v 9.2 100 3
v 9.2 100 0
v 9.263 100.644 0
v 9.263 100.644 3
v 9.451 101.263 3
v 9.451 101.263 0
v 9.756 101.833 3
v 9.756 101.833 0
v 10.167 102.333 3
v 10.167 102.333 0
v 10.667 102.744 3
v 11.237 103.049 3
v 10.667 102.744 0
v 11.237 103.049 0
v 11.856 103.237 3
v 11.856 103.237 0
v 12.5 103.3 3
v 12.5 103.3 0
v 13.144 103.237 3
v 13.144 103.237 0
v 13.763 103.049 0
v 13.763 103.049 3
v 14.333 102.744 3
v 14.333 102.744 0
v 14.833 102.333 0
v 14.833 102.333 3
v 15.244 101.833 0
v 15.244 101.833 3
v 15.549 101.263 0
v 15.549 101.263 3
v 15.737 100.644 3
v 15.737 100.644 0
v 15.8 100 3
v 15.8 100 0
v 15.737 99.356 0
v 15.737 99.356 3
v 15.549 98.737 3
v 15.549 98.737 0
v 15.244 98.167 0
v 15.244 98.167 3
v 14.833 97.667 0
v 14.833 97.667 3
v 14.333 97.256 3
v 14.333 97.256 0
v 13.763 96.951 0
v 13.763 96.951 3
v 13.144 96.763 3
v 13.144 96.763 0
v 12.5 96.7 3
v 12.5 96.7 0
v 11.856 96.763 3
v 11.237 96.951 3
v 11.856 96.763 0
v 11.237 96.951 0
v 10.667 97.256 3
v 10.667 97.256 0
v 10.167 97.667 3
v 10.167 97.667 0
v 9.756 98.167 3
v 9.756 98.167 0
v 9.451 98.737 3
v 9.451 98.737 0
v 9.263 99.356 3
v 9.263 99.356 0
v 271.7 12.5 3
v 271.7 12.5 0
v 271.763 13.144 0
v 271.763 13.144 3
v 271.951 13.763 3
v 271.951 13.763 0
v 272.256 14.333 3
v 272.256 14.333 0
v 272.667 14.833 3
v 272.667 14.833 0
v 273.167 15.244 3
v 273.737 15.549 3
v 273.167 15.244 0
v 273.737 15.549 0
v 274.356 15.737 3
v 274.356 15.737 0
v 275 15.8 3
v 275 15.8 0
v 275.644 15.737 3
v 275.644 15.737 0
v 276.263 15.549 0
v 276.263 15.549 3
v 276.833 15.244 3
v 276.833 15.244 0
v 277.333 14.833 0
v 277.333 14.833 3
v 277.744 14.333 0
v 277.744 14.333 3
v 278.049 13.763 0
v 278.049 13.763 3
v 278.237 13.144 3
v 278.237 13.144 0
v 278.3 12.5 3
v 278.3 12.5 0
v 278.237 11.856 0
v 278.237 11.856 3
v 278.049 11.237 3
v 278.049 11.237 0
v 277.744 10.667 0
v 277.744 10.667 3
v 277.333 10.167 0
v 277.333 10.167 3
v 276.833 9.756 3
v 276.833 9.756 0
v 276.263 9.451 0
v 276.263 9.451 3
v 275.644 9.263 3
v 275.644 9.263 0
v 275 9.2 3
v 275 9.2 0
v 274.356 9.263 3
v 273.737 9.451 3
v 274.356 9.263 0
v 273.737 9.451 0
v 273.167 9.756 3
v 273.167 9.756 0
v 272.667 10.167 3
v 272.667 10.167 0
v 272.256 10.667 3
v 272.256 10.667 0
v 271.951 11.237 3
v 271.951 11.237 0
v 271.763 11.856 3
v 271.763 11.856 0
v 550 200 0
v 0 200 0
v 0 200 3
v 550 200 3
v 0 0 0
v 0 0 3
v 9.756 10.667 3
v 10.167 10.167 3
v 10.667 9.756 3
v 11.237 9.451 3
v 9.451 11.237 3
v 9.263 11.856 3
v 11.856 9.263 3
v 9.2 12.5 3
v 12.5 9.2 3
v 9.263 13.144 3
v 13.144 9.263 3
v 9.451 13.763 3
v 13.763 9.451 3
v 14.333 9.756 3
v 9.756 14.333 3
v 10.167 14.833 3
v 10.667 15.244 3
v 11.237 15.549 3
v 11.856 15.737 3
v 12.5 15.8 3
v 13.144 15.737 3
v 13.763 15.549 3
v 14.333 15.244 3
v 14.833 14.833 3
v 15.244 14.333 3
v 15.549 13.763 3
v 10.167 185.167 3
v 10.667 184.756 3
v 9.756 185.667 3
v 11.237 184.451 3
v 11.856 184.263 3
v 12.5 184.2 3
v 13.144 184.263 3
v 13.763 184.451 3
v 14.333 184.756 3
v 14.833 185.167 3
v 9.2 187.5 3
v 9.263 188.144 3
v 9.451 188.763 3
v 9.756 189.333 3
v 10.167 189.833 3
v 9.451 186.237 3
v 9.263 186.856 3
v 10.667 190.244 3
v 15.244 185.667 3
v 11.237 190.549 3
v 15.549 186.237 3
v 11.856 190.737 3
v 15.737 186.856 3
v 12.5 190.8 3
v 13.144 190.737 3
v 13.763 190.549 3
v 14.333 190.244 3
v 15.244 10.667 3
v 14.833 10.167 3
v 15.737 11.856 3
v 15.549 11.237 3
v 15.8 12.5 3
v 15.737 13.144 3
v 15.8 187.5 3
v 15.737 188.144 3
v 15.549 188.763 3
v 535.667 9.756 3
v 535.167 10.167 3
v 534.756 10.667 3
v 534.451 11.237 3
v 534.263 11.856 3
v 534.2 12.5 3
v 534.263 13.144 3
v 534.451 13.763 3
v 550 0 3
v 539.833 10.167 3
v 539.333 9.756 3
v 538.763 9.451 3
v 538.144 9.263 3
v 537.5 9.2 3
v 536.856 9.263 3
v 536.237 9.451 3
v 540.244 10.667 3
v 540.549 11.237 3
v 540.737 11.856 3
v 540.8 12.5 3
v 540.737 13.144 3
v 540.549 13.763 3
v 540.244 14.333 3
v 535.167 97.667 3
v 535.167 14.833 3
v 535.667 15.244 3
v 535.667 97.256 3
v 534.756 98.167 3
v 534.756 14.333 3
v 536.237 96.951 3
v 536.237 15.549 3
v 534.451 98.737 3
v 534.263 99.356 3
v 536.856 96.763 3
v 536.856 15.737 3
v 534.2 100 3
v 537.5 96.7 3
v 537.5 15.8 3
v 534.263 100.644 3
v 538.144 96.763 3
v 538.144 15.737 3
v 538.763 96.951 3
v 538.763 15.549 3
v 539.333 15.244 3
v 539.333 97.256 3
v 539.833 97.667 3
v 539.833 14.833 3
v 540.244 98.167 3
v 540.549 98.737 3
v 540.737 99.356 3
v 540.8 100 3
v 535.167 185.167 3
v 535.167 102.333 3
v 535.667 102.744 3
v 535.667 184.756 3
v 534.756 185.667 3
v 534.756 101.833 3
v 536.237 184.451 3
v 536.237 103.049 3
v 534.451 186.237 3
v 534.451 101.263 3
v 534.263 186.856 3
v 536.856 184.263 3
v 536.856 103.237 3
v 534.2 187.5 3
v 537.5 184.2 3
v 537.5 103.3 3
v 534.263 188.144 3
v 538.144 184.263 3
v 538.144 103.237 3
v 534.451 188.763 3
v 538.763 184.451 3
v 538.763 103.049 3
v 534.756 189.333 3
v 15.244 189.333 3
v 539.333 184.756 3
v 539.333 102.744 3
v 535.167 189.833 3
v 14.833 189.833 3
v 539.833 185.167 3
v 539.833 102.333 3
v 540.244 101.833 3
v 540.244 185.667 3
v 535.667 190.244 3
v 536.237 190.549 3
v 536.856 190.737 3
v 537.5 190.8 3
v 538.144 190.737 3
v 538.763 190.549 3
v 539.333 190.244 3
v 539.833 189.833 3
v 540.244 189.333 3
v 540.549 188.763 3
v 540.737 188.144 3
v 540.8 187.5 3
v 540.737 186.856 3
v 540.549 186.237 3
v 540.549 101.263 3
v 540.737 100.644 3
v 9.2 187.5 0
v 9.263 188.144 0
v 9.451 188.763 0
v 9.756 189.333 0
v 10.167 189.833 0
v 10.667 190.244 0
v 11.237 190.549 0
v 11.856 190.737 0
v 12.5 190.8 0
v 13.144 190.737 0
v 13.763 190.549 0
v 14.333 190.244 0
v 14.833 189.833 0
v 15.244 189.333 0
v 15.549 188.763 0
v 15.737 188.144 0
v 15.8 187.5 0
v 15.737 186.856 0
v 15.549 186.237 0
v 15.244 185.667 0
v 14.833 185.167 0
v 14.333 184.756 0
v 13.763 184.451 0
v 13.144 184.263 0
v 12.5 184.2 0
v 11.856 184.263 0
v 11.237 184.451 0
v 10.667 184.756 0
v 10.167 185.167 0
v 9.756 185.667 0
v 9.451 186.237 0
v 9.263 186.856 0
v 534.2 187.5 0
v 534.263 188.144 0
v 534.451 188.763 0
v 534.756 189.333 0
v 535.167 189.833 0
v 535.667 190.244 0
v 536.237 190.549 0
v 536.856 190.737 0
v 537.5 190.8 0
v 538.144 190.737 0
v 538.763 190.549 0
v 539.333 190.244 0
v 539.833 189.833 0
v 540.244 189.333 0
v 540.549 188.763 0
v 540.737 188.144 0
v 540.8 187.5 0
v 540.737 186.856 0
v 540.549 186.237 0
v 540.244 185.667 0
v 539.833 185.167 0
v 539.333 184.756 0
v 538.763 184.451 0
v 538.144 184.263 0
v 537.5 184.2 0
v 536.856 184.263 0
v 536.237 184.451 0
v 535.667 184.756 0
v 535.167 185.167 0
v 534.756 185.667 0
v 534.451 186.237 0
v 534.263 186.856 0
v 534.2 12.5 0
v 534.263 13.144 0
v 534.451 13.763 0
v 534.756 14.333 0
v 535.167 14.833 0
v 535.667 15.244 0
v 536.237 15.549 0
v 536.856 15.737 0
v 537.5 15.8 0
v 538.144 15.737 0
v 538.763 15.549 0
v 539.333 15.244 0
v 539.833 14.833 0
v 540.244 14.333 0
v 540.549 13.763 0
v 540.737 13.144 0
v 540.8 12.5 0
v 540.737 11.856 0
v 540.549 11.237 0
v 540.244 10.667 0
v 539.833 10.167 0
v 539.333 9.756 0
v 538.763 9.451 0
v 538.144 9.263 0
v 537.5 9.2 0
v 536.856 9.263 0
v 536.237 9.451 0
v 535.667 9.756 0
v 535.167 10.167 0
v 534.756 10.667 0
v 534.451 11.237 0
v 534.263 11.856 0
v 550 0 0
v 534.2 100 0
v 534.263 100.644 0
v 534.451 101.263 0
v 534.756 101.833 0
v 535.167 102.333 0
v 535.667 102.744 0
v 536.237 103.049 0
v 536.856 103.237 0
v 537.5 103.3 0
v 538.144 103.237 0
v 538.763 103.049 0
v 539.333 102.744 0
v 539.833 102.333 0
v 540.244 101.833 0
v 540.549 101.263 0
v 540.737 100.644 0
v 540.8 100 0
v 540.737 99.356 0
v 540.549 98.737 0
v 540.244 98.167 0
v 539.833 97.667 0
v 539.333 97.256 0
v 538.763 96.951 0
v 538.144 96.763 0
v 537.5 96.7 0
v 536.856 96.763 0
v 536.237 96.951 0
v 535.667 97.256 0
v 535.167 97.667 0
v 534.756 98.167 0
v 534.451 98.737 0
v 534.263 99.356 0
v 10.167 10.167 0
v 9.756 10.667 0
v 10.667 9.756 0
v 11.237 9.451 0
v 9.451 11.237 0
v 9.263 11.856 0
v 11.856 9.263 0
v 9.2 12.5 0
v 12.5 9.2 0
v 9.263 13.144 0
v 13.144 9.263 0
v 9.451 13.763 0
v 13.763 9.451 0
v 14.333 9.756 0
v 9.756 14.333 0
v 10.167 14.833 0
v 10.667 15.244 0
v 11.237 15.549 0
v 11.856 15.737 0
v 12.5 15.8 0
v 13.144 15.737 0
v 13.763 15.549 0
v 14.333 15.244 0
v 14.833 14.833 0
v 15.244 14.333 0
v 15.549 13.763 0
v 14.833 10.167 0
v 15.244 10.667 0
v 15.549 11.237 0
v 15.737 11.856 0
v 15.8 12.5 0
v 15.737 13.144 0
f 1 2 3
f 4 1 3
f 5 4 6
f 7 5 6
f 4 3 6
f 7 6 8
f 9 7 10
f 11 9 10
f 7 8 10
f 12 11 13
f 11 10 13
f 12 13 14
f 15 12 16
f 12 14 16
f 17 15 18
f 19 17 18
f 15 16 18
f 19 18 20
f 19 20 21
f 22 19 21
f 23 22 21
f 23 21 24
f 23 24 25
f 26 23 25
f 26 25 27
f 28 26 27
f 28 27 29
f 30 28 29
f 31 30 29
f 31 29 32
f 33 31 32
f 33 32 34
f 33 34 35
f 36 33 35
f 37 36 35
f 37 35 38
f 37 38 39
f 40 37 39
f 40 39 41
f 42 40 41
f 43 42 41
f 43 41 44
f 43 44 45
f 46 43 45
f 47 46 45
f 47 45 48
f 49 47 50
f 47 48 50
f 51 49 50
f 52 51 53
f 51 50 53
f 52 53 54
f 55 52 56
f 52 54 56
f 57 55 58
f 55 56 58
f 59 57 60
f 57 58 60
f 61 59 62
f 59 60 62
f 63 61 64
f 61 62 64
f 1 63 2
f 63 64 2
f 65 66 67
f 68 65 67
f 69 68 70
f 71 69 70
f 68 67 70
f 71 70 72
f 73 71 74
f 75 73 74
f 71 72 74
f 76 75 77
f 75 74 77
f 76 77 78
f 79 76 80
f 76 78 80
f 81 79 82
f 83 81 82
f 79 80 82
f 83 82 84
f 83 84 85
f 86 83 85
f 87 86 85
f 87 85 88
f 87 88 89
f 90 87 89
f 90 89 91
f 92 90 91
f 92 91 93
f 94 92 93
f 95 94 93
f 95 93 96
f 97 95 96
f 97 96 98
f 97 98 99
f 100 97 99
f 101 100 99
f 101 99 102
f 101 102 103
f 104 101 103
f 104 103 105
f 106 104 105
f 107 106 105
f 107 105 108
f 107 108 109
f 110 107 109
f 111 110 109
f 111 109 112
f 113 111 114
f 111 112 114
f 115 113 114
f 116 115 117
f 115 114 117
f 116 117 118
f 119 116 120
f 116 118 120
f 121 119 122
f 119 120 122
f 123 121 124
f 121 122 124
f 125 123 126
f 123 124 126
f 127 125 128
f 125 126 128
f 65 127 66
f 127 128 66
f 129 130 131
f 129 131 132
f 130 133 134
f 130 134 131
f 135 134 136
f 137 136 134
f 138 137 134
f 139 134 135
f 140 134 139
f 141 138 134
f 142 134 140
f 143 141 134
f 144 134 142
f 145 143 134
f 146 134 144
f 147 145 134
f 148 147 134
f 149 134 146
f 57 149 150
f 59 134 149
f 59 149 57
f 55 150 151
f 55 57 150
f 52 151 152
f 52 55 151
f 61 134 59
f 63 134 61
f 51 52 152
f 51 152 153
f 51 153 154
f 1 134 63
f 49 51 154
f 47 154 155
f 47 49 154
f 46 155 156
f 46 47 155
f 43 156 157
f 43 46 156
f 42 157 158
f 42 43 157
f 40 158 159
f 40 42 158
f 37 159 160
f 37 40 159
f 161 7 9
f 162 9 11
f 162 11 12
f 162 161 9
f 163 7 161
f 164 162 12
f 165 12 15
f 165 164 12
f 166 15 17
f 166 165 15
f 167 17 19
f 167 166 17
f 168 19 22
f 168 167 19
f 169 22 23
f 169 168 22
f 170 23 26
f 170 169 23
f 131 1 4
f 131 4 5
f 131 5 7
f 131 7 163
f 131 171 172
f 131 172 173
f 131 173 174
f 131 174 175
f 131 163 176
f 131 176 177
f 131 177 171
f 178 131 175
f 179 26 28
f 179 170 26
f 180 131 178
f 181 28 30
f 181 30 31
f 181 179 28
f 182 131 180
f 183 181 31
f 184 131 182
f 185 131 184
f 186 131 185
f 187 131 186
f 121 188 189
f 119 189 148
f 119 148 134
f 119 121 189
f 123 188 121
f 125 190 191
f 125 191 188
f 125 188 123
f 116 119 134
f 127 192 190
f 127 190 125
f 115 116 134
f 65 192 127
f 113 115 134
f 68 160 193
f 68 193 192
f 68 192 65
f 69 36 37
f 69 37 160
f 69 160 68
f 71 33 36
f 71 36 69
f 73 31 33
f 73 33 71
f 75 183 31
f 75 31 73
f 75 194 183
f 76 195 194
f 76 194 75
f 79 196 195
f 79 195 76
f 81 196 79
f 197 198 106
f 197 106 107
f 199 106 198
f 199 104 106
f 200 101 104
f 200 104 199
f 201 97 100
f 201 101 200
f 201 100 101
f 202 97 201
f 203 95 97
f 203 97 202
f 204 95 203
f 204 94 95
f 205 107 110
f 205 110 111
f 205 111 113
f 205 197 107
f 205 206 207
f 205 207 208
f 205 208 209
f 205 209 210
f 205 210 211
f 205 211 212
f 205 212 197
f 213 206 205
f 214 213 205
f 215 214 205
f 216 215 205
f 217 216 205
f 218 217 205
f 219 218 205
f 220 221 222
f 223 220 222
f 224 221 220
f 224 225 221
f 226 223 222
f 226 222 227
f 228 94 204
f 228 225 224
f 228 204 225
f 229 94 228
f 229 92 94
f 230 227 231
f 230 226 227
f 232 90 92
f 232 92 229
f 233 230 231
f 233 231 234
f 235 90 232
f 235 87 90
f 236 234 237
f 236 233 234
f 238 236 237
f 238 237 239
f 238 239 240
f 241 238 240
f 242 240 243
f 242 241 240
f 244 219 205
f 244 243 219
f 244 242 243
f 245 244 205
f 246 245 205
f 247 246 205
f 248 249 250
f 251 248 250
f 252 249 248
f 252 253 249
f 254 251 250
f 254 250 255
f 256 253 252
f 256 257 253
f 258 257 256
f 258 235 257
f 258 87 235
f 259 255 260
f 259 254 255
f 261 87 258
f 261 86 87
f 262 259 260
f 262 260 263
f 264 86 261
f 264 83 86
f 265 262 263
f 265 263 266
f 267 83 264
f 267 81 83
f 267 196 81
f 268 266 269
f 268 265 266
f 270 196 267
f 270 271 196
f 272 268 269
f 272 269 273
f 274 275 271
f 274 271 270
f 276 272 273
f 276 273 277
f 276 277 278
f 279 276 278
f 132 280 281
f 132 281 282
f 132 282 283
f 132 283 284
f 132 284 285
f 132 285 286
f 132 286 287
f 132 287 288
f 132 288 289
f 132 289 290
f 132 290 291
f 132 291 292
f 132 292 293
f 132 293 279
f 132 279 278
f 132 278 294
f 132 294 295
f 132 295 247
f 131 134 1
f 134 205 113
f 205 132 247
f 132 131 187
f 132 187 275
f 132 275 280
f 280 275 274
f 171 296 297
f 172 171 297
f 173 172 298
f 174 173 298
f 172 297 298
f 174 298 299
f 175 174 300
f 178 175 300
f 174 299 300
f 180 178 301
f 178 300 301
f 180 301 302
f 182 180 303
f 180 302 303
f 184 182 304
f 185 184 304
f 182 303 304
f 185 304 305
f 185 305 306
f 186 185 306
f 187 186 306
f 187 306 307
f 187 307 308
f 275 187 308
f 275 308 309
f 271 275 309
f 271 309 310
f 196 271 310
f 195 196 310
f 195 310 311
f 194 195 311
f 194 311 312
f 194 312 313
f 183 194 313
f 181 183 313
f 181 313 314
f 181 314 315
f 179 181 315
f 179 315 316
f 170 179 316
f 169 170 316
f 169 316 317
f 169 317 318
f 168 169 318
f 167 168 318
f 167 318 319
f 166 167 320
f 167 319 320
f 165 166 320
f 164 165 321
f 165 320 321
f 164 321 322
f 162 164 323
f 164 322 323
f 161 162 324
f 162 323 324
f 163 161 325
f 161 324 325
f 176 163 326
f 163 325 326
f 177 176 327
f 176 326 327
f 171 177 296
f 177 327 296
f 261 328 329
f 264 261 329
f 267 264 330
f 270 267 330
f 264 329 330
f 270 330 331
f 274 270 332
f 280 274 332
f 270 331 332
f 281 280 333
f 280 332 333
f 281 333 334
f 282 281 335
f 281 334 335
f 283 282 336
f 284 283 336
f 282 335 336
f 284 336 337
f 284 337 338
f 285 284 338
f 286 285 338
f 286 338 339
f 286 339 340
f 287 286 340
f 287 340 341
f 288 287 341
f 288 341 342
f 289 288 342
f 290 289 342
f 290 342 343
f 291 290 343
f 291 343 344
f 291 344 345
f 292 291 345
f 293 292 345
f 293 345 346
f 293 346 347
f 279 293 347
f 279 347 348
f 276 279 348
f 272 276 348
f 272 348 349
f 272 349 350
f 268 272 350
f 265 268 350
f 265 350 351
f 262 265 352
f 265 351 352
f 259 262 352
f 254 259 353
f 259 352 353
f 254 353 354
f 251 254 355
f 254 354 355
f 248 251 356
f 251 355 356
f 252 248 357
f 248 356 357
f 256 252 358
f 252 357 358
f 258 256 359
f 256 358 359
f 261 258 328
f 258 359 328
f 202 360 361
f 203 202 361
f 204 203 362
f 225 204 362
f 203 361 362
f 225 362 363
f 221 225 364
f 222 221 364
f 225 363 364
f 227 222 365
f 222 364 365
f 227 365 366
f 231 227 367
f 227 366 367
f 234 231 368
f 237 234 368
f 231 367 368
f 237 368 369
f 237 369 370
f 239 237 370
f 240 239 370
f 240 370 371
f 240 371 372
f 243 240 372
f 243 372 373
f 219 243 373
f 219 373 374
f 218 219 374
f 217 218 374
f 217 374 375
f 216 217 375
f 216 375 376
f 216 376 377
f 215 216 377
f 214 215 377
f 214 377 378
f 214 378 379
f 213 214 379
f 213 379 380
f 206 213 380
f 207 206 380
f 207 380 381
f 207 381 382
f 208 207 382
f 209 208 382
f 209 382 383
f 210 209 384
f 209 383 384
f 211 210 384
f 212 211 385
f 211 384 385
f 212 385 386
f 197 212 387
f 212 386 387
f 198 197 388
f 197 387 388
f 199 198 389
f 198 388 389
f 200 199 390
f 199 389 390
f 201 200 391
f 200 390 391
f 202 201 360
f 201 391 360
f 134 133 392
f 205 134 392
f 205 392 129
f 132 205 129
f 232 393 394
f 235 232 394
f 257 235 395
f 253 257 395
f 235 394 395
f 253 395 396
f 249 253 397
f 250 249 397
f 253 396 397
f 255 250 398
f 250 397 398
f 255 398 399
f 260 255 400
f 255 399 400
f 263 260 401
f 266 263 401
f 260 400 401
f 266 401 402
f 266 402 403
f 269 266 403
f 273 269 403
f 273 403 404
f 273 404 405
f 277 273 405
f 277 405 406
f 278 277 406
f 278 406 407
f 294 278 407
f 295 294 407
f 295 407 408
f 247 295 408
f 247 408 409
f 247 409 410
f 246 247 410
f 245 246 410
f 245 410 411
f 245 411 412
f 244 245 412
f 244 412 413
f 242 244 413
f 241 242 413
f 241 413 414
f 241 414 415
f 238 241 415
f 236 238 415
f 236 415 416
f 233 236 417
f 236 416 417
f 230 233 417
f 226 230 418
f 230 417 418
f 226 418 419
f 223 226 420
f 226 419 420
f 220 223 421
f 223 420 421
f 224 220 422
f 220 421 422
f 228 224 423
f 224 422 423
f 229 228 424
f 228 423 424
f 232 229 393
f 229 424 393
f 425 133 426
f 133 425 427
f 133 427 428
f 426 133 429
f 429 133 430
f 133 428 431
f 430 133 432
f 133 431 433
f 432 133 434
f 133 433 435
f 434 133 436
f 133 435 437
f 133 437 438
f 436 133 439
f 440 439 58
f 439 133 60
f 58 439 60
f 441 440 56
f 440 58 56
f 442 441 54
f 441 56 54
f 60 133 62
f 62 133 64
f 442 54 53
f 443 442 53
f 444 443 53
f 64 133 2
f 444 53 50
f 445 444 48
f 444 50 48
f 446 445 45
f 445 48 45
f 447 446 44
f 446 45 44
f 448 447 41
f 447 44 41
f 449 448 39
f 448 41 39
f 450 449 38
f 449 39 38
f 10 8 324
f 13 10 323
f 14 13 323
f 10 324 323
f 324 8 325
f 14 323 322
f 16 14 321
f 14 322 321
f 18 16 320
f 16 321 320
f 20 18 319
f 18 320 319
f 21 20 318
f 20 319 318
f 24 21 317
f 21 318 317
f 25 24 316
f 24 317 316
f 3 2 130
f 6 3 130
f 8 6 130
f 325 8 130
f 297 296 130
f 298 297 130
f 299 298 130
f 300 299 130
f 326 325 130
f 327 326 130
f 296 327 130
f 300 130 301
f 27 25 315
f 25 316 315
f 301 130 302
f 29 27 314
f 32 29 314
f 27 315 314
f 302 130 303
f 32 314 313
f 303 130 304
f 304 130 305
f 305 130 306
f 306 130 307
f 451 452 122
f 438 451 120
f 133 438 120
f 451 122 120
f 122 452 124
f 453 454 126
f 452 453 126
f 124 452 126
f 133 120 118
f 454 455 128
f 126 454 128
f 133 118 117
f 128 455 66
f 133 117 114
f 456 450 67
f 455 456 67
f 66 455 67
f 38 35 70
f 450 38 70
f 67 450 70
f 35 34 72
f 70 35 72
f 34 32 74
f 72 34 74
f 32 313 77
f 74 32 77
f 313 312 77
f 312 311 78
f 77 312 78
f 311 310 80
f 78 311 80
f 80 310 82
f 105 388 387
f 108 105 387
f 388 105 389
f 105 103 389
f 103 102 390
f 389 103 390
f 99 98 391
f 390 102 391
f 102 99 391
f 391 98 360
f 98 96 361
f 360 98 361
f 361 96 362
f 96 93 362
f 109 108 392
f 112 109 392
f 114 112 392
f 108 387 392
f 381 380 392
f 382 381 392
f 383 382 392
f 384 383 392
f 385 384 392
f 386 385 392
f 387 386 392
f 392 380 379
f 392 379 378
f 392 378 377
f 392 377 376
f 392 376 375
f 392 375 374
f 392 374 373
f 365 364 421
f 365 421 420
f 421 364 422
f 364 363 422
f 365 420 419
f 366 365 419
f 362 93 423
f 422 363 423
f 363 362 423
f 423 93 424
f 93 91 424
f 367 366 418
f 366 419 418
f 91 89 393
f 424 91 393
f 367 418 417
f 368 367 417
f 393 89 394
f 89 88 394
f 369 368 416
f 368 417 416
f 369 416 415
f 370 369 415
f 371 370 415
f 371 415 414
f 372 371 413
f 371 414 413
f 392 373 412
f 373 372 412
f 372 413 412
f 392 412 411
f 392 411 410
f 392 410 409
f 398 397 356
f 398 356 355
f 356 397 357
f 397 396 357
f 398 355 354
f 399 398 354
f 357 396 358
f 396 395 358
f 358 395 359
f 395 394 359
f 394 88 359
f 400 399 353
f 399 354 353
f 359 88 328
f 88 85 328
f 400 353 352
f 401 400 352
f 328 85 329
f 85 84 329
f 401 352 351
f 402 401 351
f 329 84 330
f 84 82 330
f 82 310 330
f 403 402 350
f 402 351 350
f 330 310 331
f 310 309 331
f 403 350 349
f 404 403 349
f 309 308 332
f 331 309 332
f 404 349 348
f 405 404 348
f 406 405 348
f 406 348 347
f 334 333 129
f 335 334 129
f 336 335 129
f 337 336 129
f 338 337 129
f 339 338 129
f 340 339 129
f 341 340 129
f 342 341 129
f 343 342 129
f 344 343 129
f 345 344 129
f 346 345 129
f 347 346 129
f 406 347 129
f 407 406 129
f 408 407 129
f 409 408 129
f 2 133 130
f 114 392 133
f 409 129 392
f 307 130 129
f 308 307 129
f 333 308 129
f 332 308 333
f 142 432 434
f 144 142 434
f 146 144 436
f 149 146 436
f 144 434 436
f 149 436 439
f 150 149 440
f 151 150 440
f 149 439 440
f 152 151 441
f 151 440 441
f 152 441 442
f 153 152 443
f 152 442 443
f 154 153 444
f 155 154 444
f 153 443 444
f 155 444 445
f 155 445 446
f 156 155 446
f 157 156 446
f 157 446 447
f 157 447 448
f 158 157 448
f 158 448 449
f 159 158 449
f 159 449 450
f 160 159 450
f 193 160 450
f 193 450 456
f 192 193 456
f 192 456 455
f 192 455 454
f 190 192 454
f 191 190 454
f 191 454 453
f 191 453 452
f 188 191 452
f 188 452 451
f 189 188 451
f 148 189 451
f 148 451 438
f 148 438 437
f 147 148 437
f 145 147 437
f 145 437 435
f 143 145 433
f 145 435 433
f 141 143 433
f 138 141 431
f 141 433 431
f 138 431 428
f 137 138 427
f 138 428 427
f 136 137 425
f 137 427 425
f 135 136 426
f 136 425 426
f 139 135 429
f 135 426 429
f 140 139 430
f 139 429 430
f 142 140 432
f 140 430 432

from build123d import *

# Parameters (mm, degrees)
SKETCH1_W            = 550
SKETCH1_H            = 200
BOSS_EXTRUDE1_DEPTH  = 3
M6_CLEARANCE_HOLE1_D = 6.6


with BuildPart() as part:
    # Sketch1 → Boss-Extrude1 (new body)
    with BuildSketch(Plane.XY):
        with Locations((275, 100)):
            Rectangle(SKETCH1_W, SKETCH1_H)
    extrude(amount=BOSS_EXTRUDE1_DEPTH)

    # M6 Clearance Hole1 (through all)
    with Locations(Plane.XY.offset(3)):
        with Locations((12.5, 100), (12.5, 187.5), (12.5, 12.5), (275, 12.5), (537.5, 12.5), (537.5, 100), (537.5, 187.5)):
            Hole(M6_CLEARANCE_HOLE1_D / 2)


solid = part.part
